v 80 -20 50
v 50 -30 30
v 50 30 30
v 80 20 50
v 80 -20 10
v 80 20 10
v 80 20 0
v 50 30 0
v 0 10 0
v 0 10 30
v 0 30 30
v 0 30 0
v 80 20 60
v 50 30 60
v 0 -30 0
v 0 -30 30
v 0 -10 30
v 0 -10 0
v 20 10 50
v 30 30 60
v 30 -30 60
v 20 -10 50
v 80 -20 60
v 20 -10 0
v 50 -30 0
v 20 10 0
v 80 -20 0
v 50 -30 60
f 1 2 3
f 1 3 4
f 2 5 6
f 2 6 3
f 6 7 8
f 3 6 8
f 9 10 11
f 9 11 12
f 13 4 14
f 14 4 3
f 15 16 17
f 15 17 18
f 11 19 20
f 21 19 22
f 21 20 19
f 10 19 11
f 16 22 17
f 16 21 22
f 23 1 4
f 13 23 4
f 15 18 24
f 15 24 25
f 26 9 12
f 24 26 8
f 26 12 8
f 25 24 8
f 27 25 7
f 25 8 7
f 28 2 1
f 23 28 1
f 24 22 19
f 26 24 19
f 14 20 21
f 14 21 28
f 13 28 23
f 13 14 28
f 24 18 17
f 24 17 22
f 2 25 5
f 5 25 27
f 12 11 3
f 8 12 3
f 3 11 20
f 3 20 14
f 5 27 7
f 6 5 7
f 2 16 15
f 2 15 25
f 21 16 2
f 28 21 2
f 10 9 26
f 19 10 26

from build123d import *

# Parameters (mm, degrees)
PAD_DEPTH         = 30
PAD001_DEPTH      = 60
POCKET_DEPTH      = 30.001
POCKET_DEPTH_BACK = -30.001
SKETCH003_W       = 20
SKETCH003_H       = 20
POCKET001_DEPTH   = 60.001


with BuildPart() as part:
    # Sketch → Pad (new body, symmetric)
    with BuildSketch(Plane.XZ):
        Polygon((0, 30), (0, 0), (50, 0), (50, 60), (30, 60), align=None)
    extrude(amount=PAD_DEPTH, both=True)

    # Sketch001 → Pad001 (join)
    with BuildSketch(Plane.XY):
        Polygon((50, 30), (50, -30), (80, -20), (80, 20), align=None)
    extrude(amount=PAD001_DEPTH)

    # Sketch002 → Pocket (cut, two sides)
    with BuildSketch(Plane.XZ) as pocket_sk:
        Polygon((80, 50), (80, 10), (50, 30), align=None)
    extrude(amount=-POCKET_DEPTH, mode=Mode.SUBTRACT)
    extrude(pocket_sk.sketch, amount=-POCKET_DEPTH_BACK, mode=Mode.SUBTRACT)

    # Sketch003 → Pocket001 (cut, through all)
    with BuildSketch(Plane.XY):
        with Locations((10, 0)):
            Rectangle(SKETCH003_W, SKETCH003_H)
    extrude(amount=POCKET001_DEPTH, mode=Mode.SUBTRACT)


solid = part.part
